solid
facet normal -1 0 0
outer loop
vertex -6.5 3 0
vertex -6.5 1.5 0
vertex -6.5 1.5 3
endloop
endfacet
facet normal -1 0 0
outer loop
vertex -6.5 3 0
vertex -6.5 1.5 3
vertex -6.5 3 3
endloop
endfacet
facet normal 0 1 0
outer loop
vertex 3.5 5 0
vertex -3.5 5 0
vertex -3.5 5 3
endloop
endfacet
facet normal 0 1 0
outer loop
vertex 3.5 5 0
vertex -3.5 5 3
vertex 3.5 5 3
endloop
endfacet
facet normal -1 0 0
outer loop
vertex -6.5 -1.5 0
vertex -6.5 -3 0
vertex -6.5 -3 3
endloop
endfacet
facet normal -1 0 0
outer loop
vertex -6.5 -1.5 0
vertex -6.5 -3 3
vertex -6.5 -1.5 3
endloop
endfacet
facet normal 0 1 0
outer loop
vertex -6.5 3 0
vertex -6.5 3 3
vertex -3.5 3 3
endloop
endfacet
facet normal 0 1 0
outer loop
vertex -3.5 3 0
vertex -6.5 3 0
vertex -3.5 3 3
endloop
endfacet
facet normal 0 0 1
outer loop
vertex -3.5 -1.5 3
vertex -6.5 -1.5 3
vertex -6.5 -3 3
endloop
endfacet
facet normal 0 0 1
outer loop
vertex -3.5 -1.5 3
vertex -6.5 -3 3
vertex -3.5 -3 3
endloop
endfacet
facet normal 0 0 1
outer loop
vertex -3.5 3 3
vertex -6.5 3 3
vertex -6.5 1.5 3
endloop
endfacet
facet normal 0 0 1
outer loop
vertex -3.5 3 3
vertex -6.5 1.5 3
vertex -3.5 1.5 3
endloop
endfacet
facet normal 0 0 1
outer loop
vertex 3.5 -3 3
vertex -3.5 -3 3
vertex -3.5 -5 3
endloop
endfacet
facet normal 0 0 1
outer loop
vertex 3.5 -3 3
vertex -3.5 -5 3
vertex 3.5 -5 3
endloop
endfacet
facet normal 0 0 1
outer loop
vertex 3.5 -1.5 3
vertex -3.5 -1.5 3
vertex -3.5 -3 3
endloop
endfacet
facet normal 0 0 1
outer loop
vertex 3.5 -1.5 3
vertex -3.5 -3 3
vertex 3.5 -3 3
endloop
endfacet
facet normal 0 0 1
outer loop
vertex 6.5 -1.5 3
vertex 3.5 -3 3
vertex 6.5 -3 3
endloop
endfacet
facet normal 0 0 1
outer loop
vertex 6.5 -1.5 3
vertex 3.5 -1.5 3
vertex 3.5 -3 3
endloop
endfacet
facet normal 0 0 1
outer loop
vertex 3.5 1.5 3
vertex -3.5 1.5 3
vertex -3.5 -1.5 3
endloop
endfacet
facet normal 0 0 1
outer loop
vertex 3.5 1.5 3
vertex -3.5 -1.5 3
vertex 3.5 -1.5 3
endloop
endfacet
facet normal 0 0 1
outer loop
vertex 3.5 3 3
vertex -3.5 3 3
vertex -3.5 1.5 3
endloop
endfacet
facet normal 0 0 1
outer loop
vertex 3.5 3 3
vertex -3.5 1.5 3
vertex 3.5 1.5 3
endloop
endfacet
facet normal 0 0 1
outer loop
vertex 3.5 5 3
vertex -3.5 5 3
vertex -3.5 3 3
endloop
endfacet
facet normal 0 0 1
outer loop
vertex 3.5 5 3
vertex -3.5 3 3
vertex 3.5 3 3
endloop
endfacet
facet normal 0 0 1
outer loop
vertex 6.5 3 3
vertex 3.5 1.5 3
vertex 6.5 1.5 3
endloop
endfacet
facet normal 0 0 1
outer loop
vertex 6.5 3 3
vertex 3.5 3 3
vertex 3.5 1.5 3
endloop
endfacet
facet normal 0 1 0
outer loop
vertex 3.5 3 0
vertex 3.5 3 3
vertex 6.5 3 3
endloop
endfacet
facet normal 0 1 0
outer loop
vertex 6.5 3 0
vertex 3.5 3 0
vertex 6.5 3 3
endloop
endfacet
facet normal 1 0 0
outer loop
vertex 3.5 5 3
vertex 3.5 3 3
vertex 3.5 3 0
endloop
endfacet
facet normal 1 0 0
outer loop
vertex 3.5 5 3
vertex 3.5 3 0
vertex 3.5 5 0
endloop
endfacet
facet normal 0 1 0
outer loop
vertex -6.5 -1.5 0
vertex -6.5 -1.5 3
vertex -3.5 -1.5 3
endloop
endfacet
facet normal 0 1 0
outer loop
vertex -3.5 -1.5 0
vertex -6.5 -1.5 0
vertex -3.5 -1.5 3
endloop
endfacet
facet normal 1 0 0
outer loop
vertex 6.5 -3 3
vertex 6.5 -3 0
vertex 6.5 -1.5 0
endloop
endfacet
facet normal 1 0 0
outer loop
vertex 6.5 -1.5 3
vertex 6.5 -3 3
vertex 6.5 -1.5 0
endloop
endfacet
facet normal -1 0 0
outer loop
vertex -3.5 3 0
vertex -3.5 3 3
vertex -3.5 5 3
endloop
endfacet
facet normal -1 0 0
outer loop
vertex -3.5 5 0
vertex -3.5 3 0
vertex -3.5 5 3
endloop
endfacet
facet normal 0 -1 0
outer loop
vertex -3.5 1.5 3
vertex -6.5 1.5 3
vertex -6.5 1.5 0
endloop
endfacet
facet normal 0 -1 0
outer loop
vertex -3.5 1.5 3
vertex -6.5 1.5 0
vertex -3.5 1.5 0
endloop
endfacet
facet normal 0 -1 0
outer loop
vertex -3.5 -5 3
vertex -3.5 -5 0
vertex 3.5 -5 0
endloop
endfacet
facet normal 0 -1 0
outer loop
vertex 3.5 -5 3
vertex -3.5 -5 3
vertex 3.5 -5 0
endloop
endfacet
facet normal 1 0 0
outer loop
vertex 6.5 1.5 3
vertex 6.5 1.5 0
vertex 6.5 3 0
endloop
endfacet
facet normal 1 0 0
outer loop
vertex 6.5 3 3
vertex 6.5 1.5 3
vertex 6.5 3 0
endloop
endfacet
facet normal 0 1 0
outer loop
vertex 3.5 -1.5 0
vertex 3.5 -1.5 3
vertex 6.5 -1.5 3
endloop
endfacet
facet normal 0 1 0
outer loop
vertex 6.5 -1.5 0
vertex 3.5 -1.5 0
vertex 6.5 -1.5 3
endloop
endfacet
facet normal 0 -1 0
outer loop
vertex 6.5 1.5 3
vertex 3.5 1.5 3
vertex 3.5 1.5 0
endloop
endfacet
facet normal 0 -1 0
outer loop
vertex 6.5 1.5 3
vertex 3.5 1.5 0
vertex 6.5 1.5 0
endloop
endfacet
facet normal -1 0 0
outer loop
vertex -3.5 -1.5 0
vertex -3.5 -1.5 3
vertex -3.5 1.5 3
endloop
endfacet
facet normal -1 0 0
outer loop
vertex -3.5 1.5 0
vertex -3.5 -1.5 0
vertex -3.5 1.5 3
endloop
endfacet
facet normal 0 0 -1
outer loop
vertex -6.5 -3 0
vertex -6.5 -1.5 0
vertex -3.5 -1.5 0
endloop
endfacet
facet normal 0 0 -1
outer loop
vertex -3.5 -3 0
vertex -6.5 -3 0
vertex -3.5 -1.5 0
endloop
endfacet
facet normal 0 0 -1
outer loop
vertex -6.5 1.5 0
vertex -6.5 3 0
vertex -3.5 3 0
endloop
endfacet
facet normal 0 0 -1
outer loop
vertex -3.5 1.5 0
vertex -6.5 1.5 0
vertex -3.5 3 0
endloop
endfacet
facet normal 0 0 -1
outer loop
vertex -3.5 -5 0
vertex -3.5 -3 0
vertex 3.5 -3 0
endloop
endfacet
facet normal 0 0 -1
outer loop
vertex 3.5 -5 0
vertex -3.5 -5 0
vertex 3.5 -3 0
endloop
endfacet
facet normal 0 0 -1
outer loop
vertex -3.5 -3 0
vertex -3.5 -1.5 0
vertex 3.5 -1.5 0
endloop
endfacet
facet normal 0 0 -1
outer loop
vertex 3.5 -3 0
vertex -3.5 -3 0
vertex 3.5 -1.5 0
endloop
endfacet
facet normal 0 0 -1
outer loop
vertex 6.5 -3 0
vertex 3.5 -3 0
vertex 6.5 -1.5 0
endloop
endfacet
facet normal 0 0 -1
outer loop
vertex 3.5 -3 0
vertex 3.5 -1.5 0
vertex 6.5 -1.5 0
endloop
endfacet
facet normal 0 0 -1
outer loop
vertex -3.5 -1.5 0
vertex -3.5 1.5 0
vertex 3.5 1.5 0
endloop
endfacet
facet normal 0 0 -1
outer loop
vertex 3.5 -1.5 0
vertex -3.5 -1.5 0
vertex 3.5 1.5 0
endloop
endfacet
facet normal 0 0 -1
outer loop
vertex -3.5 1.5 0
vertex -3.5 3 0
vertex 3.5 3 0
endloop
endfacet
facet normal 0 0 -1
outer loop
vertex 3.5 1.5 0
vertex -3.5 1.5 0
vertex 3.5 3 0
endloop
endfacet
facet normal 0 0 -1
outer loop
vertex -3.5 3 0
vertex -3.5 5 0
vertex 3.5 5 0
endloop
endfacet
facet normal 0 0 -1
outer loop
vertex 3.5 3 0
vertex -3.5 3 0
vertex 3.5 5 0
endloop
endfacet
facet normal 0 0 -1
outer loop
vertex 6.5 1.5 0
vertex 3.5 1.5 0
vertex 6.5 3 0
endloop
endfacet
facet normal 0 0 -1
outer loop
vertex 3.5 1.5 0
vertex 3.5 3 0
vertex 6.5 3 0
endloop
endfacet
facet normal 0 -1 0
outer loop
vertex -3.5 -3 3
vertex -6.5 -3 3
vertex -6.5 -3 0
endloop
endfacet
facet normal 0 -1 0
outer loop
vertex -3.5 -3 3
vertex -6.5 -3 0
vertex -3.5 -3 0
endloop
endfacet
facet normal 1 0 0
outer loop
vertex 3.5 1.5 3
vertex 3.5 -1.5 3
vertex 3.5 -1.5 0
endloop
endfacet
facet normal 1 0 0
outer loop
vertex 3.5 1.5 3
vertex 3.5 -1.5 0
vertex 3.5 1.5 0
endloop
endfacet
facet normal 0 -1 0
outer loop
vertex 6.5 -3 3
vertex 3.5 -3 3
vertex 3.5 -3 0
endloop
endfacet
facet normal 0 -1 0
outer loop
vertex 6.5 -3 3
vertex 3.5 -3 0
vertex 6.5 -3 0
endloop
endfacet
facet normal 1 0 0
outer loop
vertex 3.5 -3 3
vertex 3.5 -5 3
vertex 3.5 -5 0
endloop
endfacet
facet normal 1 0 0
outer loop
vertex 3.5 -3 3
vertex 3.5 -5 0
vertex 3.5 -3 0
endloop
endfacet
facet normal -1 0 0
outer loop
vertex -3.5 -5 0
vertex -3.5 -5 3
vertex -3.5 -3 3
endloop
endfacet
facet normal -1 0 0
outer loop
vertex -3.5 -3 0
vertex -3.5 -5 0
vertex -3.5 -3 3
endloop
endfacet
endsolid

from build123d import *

# Parameters (mm, degrees)
SKETCH1_W           = 13
SKETCH1_H           = 10
BOSS_EXTRUDE1_DEPTH = 3
SKETCH2_W           = 3
SKETCH2_H           = 2
SKETCH2_H_2         = 3
CUT_EXTRUDE1_DEPTH  = 3
SKETCH3_W           = 3
SKETCH3_H           = 2
SKETCH3_H_2         = 3
CUT_EXTRUDE2_DEPTH  = 3


with BuildPart() as part:
    # Sketch1 → Boss-Extrude1 (new body)
    with BuildSketch(Plane.XY):
        Rectangle(SKETCH1_W, SKETCH1_H)
    extrude(amount=BOSS_EXTRUDE1_DEPTH)

    # Sketch2 → Cut-Extrude1 (cut)
    with BuildSketch(Plane.XY.offset(3)):
        with Locations((-5, 4)):
            Rectangle(SKETCH2_W, SKETCH2_H)
        with Locations((-5, 0)):
            Rectangle(SKETCH2_W, SKETCH2_H_2)
        with Locations((-5, -4)):
            Rectangle(SKETCH2_W, SKETCH2_H)
    extrude(amount=-CUT_EXTRUDE1_DEPTH, mode=Mode.SUBTRACT)

    # Sketch3 → Cut-Extrude2 (cut)
    with BuildSketch(Plane.XY.offset(3)):
        with Locations((5, 4)):
            Rectangle(SKETCH3_W, SKETCH3_H)
        with Locations((5, 0)):
            Rectangle(SKETCH3_W, SKETCH3_H_2)
        with Locations((5, -4)):
            Rectangle(SKETCH3_W, SKETCH3_H)
    extrude(amount=-CUT_EXTRUDE2_DEPTH, mode=Mode.SUBTRACT)


solid = part.part
